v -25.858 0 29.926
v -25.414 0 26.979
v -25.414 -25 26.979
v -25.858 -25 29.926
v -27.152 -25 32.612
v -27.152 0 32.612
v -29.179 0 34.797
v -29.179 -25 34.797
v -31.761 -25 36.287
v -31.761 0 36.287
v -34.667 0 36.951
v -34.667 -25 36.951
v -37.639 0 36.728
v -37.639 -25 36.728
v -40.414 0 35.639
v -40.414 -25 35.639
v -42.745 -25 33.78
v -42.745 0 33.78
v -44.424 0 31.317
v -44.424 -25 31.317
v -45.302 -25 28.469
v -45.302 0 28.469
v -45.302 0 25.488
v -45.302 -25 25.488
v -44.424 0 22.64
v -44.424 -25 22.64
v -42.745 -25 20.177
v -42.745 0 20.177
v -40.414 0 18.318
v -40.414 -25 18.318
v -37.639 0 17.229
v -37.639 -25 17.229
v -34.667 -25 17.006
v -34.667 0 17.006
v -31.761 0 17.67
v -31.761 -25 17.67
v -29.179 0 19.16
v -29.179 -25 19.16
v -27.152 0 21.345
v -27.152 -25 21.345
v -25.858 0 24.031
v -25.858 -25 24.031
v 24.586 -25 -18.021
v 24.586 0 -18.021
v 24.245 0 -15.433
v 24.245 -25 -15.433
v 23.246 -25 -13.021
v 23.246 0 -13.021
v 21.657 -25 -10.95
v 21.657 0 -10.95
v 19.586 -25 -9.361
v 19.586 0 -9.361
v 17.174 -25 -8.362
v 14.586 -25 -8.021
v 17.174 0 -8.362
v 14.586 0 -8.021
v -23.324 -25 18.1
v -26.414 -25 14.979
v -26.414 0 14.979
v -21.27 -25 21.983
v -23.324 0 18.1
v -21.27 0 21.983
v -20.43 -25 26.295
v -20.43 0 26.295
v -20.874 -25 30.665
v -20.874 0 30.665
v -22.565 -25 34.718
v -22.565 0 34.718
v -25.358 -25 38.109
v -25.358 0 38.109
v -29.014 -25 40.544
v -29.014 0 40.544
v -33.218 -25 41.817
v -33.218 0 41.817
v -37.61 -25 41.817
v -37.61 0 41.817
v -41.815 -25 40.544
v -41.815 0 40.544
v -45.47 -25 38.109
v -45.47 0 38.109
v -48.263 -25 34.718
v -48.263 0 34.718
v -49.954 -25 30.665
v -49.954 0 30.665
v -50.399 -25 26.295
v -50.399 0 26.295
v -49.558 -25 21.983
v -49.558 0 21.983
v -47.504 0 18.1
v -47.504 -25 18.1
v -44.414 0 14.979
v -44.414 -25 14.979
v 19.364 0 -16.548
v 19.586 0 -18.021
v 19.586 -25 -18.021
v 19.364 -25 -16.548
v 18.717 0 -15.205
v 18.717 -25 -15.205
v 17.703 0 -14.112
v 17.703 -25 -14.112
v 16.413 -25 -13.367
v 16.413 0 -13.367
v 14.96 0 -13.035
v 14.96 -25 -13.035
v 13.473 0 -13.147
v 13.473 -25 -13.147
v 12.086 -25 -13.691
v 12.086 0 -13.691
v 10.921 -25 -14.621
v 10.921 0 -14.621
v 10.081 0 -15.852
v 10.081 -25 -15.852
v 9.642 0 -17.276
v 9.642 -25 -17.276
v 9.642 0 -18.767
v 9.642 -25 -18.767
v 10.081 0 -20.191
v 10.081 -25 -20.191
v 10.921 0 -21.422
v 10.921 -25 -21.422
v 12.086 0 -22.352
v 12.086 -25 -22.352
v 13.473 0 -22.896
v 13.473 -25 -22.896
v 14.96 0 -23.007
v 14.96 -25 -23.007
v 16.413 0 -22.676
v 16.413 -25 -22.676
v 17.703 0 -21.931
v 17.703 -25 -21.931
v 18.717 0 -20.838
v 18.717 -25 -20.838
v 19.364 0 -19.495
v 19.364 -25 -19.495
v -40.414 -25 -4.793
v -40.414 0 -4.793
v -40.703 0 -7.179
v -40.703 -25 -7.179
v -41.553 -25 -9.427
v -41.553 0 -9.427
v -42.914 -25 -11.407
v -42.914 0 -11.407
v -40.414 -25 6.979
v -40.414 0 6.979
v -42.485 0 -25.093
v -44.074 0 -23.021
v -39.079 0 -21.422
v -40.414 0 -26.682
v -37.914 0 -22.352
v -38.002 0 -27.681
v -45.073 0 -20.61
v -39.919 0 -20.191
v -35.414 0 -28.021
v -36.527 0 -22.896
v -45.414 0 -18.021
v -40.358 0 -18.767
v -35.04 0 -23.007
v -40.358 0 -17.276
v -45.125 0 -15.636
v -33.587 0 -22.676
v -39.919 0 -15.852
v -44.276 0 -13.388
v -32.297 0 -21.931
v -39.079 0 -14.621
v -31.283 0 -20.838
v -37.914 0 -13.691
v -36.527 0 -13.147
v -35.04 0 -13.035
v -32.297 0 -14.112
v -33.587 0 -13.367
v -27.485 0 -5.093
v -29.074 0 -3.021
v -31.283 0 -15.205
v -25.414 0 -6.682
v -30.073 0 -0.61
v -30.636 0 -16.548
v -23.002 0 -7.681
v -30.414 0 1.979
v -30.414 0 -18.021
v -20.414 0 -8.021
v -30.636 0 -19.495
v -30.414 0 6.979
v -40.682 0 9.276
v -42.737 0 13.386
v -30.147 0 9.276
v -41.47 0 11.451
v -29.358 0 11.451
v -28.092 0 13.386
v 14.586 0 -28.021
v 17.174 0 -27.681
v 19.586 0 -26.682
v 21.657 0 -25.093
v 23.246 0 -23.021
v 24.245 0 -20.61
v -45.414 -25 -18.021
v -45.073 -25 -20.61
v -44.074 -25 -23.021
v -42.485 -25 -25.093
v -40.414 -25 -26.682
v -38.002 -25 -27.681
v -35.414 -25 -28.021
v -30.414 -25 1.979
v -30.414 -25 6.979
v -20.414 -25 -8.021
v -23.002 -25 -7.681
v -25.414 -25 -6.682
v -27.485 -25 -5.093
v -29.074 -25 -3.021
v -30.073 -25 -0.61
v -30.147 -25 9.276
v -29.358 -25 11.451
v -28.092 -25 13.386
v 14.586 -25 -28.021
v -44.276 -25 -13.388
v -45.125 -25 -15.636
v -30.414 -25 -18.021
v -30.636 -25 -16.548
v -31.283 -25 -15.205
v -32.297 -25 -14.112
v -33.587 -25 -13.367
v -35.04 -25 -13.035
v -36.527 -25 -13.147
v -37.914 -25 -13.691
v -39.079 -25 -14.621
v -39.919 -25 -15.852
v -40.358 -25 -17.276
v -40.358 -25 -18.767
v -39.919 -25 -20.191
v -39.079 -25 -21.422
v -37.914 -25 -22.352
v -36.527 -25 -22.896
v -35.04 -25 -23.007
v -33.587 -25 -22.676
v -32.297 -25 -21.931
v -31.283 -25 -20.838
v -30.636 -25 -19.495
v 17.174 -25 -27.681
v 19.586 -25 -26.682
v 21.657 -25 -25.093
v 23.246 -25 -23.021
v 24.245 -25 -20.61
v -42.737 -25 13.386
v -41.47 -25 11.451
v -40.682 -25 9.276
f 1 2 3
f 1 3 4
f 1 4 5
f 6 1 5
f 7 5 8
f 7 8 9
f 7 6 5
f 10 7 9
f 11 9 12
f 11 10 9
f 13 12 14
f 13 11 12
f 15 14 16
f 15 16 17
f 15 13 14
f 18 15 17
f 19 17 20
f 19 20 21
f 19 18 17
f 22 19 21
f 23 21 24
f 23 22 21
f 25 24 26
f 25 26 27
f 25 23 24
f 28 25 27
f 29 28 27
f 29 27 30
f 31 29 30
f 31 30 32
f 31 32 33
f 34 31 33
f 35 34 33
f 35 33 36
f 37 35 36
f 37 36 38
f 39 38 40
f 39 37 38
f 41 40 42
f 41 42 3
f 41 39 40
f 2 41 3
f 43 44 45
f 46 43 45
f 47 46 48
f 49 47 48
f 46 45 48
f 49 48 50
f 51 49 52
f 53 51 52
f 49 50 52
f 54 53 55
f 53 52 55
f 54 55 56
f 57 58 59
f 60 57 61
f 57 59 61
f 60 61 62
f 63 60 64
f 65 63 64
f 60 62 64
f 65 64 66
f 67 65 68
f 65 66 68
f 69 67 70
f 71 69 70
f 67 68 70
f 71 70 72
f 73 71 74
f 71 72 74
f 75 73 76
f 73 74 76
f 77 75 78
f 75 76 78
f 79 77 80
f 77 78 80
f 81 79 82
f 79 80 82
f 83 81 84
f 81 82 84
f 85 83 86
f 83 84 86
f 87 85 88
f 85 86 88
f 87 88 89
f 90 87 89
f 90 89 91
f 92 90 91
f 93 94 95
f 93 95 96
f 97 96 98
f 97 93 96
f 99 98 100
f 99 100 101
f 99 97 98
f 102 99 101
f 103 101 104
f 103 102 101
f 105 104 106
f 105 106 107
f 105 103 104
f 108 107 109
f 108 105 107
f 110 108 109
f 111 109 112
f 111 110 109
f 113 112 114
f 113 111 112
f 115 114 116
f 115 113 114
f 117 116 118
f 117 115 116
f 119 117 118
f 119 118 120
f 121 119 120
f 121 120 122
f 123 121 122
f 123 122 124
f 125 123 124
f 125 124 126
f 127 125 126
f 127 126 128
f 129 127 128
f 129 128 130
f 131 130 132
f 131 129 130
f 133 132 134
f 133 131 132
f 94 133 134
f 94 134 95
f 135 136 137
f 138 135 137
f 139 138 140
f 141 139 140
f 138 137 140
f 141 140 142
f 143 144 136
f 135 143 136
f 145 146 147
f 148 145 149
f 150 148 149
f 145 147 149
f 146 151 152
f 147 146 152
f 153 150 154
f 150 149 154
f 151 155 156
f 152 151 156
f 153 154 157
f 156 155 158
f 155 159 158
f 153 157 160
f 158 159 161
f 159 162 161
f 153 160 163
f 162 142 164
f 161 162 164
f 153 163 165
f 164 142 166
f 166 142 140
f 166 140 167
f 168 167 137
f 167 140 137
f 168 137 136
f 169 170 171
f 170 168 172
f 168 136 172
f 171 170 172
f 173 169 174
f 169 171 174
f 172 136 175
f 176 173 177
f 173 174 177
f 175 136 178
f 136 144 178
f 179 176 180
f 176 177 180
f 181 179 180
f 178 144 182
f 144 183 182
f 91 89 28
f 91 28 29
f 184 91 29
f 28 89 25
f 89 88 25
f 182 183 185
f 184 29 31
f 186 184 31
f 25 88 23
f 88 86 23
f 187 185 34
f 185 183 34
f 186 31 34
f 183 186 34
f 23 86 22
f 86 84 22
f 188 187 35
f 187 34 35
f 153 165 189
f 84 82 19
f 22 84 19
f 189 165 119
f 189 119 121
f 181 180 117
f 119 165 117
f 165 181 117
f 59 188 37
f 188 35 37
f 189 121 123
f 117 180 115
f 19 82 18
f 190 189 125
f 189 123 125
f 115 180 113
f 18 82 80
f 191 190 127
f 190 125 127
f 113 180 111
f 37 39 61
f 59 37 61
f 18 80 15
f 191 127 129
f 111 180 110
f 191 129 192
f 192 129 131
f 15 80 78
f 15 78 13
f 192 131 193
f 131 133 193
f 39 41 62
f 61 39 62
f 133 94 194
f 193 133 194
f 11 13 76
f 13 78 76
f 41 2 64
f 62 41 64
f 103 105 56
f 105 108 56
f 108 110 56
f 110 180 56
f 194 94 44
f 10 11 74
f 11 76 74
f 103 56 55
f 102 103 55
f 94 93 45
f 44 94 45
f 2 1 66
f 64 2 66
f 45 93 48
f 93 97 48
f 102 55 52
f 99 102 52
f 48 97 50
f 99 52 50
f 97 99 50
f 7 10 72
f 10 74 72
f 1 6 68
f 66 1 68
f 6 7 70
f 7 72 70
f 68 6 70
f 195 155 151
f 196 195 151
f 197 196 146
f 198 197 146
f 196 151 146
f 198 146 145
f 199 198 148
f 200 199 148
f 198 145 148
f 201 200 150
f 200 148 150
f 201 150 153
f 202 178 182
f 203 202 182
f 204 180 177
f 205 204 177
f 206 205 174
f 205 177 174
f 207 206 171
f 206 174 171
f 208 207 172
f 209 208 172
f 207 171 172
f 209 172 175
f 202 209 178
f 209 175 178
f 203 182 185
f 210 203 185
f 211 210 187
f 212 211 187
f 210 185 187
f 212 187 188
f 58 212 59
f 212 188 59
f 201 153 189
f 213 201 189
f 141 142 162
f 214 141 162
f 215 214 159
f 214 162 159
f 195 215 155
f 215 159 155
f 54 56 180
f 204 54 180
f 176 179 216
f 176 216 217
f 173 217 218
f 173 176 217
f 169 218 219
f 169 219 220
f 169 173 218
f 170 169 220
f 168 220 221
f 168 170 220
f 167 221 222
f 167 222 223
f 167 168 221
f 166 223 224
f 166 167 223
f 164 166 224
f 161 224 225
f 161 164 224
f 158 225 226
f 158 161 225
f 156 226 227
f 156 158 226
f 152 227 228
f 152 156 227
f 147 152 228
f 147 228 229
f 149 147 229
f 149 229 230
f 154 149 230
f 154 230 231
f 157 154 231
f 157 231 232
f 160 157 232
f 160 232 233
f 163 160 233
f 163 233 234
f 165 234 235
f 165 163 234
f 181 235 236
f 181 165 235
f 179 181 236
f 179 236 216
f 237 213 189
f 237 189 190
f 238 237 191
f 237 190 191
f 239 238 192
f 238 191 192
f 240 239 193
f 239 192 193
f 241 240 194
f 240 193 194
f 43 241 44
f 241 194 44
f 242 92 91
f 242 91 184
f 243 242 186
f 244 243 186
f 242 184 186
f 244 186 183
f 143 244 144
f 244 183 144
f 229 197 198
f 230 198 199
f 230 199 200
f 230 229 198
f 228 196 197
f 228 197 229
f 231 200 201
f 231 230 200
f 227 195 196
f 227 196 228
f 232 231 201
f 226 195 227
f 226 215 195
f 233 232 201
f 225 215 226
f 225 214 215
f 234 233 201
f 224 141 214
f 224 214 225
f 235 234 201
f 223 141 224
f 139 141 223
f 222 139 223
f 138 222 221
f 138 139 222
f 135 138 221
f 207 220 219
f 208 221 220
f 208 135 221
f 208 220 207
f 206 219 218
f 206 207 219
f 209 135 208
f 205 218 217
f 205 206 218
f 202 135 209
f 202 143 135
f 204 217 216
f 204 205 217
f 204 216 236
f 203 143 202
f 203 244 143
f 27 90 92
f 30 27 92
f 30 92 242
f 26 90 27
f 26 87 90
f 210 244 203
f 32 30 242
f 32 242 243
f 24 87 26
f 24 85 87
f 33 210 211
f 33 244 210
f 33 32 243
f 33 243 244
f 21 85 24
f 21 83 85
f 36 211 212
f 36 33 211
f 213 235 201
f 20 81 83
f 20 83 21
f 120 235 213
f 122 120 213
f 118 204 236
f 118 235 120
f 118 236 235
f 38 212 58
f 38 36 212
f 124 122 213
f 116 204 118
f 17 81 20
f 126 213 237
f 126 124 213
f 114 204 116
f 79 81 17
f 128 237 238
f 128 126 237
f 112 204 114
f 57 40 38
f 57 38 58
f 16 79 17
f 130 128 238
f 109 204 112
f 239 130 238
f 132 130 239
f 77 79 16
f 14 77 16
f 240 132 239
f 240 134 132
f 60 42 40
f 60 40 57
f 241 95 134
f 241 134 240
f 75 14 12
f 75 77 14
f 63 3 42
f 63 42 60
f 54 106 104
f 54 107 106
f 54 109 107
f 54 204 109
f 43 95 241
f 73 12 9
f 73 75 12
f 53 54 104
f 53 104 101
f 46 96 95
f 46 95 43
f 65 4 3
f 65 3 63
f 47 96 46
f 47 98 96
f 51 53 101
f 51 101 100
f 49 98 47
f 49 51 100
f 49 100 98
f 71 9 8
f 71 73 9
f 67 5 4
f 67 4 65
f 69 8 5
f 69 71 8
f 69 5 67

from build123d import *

# Parameters (mm, degrees)
F0_R     = 5
F0_R_2   = 10
F1_DEPTH = 25


with BuildPart() as f1:
    # F0 (on Front) → F1 (new body)
    with BuildSketch(Plane.XZ):
        with BuildLine():
            ThreePointArc((-45.414113, -18.021473), (-42.48518, -25.092541), (-35.414113, -28.021473))
            Line((-35.414113, -28.021473), (14.585887, -28.021473))
            ThreePointArc((14.585887, -28.021473), (21.656955, -25.092541), (24.585887, -18.021473))
            ThreePointArc((24.585887, -18.021473), (21.656955, -10.950406), (14.585887, -8.021473))
            Line((14.585887, -8.021473), (-11.111964, -8.021473))
            Line((-11.111964, -8.021473), (-20.414113, -8.021473))
            ThreePointArc((-20.414113, -8.021473), (-27.48518, -5.092541), (-30.414113, 1.978527))
            Line((-30.414113, 1.978527), (-30.414113, 6.978527))
            ThreePointArc((-30.414113, 6.978527), (-29.358384, 11.450663), (-26.414113, 14.978527))
            ThreePointArc((-26.414113, 14.978527), (-35.414113, 41.978527), (-44.414113, 14.978527))
            ThreePointArc((-44.414113, 14.978527), (-41.469841, 11.450663), (-40.414113, 6.978527))
            Line((-40.414113, 6.978527), (-40.414113, -4.792717))
            ThreePointArc((-40.414113, -4.792717), (-41.059969, -8.328251), (-42.914113, -11.407095))
            ThreePointArc((-42.914113, -11.407095), (-44.768256, -14.48594), (-45.414113, -18.021473))
        make_face()
        with Locations((-35.414113, -18.021473)):
            Circle(F0_R, mode=Mode.SUBTRACT)
        with Locations((14.585887, -18.021473)):
            Circle(F0_R, mode=Mode.SUBTRACT)
        with Locations((-35.414113, 26.978527)):
            Circle(F0_R_2, mode=Mode.SUBTRACT)
    extrude(amount=F1_DEPTH)


solid = f1.part
